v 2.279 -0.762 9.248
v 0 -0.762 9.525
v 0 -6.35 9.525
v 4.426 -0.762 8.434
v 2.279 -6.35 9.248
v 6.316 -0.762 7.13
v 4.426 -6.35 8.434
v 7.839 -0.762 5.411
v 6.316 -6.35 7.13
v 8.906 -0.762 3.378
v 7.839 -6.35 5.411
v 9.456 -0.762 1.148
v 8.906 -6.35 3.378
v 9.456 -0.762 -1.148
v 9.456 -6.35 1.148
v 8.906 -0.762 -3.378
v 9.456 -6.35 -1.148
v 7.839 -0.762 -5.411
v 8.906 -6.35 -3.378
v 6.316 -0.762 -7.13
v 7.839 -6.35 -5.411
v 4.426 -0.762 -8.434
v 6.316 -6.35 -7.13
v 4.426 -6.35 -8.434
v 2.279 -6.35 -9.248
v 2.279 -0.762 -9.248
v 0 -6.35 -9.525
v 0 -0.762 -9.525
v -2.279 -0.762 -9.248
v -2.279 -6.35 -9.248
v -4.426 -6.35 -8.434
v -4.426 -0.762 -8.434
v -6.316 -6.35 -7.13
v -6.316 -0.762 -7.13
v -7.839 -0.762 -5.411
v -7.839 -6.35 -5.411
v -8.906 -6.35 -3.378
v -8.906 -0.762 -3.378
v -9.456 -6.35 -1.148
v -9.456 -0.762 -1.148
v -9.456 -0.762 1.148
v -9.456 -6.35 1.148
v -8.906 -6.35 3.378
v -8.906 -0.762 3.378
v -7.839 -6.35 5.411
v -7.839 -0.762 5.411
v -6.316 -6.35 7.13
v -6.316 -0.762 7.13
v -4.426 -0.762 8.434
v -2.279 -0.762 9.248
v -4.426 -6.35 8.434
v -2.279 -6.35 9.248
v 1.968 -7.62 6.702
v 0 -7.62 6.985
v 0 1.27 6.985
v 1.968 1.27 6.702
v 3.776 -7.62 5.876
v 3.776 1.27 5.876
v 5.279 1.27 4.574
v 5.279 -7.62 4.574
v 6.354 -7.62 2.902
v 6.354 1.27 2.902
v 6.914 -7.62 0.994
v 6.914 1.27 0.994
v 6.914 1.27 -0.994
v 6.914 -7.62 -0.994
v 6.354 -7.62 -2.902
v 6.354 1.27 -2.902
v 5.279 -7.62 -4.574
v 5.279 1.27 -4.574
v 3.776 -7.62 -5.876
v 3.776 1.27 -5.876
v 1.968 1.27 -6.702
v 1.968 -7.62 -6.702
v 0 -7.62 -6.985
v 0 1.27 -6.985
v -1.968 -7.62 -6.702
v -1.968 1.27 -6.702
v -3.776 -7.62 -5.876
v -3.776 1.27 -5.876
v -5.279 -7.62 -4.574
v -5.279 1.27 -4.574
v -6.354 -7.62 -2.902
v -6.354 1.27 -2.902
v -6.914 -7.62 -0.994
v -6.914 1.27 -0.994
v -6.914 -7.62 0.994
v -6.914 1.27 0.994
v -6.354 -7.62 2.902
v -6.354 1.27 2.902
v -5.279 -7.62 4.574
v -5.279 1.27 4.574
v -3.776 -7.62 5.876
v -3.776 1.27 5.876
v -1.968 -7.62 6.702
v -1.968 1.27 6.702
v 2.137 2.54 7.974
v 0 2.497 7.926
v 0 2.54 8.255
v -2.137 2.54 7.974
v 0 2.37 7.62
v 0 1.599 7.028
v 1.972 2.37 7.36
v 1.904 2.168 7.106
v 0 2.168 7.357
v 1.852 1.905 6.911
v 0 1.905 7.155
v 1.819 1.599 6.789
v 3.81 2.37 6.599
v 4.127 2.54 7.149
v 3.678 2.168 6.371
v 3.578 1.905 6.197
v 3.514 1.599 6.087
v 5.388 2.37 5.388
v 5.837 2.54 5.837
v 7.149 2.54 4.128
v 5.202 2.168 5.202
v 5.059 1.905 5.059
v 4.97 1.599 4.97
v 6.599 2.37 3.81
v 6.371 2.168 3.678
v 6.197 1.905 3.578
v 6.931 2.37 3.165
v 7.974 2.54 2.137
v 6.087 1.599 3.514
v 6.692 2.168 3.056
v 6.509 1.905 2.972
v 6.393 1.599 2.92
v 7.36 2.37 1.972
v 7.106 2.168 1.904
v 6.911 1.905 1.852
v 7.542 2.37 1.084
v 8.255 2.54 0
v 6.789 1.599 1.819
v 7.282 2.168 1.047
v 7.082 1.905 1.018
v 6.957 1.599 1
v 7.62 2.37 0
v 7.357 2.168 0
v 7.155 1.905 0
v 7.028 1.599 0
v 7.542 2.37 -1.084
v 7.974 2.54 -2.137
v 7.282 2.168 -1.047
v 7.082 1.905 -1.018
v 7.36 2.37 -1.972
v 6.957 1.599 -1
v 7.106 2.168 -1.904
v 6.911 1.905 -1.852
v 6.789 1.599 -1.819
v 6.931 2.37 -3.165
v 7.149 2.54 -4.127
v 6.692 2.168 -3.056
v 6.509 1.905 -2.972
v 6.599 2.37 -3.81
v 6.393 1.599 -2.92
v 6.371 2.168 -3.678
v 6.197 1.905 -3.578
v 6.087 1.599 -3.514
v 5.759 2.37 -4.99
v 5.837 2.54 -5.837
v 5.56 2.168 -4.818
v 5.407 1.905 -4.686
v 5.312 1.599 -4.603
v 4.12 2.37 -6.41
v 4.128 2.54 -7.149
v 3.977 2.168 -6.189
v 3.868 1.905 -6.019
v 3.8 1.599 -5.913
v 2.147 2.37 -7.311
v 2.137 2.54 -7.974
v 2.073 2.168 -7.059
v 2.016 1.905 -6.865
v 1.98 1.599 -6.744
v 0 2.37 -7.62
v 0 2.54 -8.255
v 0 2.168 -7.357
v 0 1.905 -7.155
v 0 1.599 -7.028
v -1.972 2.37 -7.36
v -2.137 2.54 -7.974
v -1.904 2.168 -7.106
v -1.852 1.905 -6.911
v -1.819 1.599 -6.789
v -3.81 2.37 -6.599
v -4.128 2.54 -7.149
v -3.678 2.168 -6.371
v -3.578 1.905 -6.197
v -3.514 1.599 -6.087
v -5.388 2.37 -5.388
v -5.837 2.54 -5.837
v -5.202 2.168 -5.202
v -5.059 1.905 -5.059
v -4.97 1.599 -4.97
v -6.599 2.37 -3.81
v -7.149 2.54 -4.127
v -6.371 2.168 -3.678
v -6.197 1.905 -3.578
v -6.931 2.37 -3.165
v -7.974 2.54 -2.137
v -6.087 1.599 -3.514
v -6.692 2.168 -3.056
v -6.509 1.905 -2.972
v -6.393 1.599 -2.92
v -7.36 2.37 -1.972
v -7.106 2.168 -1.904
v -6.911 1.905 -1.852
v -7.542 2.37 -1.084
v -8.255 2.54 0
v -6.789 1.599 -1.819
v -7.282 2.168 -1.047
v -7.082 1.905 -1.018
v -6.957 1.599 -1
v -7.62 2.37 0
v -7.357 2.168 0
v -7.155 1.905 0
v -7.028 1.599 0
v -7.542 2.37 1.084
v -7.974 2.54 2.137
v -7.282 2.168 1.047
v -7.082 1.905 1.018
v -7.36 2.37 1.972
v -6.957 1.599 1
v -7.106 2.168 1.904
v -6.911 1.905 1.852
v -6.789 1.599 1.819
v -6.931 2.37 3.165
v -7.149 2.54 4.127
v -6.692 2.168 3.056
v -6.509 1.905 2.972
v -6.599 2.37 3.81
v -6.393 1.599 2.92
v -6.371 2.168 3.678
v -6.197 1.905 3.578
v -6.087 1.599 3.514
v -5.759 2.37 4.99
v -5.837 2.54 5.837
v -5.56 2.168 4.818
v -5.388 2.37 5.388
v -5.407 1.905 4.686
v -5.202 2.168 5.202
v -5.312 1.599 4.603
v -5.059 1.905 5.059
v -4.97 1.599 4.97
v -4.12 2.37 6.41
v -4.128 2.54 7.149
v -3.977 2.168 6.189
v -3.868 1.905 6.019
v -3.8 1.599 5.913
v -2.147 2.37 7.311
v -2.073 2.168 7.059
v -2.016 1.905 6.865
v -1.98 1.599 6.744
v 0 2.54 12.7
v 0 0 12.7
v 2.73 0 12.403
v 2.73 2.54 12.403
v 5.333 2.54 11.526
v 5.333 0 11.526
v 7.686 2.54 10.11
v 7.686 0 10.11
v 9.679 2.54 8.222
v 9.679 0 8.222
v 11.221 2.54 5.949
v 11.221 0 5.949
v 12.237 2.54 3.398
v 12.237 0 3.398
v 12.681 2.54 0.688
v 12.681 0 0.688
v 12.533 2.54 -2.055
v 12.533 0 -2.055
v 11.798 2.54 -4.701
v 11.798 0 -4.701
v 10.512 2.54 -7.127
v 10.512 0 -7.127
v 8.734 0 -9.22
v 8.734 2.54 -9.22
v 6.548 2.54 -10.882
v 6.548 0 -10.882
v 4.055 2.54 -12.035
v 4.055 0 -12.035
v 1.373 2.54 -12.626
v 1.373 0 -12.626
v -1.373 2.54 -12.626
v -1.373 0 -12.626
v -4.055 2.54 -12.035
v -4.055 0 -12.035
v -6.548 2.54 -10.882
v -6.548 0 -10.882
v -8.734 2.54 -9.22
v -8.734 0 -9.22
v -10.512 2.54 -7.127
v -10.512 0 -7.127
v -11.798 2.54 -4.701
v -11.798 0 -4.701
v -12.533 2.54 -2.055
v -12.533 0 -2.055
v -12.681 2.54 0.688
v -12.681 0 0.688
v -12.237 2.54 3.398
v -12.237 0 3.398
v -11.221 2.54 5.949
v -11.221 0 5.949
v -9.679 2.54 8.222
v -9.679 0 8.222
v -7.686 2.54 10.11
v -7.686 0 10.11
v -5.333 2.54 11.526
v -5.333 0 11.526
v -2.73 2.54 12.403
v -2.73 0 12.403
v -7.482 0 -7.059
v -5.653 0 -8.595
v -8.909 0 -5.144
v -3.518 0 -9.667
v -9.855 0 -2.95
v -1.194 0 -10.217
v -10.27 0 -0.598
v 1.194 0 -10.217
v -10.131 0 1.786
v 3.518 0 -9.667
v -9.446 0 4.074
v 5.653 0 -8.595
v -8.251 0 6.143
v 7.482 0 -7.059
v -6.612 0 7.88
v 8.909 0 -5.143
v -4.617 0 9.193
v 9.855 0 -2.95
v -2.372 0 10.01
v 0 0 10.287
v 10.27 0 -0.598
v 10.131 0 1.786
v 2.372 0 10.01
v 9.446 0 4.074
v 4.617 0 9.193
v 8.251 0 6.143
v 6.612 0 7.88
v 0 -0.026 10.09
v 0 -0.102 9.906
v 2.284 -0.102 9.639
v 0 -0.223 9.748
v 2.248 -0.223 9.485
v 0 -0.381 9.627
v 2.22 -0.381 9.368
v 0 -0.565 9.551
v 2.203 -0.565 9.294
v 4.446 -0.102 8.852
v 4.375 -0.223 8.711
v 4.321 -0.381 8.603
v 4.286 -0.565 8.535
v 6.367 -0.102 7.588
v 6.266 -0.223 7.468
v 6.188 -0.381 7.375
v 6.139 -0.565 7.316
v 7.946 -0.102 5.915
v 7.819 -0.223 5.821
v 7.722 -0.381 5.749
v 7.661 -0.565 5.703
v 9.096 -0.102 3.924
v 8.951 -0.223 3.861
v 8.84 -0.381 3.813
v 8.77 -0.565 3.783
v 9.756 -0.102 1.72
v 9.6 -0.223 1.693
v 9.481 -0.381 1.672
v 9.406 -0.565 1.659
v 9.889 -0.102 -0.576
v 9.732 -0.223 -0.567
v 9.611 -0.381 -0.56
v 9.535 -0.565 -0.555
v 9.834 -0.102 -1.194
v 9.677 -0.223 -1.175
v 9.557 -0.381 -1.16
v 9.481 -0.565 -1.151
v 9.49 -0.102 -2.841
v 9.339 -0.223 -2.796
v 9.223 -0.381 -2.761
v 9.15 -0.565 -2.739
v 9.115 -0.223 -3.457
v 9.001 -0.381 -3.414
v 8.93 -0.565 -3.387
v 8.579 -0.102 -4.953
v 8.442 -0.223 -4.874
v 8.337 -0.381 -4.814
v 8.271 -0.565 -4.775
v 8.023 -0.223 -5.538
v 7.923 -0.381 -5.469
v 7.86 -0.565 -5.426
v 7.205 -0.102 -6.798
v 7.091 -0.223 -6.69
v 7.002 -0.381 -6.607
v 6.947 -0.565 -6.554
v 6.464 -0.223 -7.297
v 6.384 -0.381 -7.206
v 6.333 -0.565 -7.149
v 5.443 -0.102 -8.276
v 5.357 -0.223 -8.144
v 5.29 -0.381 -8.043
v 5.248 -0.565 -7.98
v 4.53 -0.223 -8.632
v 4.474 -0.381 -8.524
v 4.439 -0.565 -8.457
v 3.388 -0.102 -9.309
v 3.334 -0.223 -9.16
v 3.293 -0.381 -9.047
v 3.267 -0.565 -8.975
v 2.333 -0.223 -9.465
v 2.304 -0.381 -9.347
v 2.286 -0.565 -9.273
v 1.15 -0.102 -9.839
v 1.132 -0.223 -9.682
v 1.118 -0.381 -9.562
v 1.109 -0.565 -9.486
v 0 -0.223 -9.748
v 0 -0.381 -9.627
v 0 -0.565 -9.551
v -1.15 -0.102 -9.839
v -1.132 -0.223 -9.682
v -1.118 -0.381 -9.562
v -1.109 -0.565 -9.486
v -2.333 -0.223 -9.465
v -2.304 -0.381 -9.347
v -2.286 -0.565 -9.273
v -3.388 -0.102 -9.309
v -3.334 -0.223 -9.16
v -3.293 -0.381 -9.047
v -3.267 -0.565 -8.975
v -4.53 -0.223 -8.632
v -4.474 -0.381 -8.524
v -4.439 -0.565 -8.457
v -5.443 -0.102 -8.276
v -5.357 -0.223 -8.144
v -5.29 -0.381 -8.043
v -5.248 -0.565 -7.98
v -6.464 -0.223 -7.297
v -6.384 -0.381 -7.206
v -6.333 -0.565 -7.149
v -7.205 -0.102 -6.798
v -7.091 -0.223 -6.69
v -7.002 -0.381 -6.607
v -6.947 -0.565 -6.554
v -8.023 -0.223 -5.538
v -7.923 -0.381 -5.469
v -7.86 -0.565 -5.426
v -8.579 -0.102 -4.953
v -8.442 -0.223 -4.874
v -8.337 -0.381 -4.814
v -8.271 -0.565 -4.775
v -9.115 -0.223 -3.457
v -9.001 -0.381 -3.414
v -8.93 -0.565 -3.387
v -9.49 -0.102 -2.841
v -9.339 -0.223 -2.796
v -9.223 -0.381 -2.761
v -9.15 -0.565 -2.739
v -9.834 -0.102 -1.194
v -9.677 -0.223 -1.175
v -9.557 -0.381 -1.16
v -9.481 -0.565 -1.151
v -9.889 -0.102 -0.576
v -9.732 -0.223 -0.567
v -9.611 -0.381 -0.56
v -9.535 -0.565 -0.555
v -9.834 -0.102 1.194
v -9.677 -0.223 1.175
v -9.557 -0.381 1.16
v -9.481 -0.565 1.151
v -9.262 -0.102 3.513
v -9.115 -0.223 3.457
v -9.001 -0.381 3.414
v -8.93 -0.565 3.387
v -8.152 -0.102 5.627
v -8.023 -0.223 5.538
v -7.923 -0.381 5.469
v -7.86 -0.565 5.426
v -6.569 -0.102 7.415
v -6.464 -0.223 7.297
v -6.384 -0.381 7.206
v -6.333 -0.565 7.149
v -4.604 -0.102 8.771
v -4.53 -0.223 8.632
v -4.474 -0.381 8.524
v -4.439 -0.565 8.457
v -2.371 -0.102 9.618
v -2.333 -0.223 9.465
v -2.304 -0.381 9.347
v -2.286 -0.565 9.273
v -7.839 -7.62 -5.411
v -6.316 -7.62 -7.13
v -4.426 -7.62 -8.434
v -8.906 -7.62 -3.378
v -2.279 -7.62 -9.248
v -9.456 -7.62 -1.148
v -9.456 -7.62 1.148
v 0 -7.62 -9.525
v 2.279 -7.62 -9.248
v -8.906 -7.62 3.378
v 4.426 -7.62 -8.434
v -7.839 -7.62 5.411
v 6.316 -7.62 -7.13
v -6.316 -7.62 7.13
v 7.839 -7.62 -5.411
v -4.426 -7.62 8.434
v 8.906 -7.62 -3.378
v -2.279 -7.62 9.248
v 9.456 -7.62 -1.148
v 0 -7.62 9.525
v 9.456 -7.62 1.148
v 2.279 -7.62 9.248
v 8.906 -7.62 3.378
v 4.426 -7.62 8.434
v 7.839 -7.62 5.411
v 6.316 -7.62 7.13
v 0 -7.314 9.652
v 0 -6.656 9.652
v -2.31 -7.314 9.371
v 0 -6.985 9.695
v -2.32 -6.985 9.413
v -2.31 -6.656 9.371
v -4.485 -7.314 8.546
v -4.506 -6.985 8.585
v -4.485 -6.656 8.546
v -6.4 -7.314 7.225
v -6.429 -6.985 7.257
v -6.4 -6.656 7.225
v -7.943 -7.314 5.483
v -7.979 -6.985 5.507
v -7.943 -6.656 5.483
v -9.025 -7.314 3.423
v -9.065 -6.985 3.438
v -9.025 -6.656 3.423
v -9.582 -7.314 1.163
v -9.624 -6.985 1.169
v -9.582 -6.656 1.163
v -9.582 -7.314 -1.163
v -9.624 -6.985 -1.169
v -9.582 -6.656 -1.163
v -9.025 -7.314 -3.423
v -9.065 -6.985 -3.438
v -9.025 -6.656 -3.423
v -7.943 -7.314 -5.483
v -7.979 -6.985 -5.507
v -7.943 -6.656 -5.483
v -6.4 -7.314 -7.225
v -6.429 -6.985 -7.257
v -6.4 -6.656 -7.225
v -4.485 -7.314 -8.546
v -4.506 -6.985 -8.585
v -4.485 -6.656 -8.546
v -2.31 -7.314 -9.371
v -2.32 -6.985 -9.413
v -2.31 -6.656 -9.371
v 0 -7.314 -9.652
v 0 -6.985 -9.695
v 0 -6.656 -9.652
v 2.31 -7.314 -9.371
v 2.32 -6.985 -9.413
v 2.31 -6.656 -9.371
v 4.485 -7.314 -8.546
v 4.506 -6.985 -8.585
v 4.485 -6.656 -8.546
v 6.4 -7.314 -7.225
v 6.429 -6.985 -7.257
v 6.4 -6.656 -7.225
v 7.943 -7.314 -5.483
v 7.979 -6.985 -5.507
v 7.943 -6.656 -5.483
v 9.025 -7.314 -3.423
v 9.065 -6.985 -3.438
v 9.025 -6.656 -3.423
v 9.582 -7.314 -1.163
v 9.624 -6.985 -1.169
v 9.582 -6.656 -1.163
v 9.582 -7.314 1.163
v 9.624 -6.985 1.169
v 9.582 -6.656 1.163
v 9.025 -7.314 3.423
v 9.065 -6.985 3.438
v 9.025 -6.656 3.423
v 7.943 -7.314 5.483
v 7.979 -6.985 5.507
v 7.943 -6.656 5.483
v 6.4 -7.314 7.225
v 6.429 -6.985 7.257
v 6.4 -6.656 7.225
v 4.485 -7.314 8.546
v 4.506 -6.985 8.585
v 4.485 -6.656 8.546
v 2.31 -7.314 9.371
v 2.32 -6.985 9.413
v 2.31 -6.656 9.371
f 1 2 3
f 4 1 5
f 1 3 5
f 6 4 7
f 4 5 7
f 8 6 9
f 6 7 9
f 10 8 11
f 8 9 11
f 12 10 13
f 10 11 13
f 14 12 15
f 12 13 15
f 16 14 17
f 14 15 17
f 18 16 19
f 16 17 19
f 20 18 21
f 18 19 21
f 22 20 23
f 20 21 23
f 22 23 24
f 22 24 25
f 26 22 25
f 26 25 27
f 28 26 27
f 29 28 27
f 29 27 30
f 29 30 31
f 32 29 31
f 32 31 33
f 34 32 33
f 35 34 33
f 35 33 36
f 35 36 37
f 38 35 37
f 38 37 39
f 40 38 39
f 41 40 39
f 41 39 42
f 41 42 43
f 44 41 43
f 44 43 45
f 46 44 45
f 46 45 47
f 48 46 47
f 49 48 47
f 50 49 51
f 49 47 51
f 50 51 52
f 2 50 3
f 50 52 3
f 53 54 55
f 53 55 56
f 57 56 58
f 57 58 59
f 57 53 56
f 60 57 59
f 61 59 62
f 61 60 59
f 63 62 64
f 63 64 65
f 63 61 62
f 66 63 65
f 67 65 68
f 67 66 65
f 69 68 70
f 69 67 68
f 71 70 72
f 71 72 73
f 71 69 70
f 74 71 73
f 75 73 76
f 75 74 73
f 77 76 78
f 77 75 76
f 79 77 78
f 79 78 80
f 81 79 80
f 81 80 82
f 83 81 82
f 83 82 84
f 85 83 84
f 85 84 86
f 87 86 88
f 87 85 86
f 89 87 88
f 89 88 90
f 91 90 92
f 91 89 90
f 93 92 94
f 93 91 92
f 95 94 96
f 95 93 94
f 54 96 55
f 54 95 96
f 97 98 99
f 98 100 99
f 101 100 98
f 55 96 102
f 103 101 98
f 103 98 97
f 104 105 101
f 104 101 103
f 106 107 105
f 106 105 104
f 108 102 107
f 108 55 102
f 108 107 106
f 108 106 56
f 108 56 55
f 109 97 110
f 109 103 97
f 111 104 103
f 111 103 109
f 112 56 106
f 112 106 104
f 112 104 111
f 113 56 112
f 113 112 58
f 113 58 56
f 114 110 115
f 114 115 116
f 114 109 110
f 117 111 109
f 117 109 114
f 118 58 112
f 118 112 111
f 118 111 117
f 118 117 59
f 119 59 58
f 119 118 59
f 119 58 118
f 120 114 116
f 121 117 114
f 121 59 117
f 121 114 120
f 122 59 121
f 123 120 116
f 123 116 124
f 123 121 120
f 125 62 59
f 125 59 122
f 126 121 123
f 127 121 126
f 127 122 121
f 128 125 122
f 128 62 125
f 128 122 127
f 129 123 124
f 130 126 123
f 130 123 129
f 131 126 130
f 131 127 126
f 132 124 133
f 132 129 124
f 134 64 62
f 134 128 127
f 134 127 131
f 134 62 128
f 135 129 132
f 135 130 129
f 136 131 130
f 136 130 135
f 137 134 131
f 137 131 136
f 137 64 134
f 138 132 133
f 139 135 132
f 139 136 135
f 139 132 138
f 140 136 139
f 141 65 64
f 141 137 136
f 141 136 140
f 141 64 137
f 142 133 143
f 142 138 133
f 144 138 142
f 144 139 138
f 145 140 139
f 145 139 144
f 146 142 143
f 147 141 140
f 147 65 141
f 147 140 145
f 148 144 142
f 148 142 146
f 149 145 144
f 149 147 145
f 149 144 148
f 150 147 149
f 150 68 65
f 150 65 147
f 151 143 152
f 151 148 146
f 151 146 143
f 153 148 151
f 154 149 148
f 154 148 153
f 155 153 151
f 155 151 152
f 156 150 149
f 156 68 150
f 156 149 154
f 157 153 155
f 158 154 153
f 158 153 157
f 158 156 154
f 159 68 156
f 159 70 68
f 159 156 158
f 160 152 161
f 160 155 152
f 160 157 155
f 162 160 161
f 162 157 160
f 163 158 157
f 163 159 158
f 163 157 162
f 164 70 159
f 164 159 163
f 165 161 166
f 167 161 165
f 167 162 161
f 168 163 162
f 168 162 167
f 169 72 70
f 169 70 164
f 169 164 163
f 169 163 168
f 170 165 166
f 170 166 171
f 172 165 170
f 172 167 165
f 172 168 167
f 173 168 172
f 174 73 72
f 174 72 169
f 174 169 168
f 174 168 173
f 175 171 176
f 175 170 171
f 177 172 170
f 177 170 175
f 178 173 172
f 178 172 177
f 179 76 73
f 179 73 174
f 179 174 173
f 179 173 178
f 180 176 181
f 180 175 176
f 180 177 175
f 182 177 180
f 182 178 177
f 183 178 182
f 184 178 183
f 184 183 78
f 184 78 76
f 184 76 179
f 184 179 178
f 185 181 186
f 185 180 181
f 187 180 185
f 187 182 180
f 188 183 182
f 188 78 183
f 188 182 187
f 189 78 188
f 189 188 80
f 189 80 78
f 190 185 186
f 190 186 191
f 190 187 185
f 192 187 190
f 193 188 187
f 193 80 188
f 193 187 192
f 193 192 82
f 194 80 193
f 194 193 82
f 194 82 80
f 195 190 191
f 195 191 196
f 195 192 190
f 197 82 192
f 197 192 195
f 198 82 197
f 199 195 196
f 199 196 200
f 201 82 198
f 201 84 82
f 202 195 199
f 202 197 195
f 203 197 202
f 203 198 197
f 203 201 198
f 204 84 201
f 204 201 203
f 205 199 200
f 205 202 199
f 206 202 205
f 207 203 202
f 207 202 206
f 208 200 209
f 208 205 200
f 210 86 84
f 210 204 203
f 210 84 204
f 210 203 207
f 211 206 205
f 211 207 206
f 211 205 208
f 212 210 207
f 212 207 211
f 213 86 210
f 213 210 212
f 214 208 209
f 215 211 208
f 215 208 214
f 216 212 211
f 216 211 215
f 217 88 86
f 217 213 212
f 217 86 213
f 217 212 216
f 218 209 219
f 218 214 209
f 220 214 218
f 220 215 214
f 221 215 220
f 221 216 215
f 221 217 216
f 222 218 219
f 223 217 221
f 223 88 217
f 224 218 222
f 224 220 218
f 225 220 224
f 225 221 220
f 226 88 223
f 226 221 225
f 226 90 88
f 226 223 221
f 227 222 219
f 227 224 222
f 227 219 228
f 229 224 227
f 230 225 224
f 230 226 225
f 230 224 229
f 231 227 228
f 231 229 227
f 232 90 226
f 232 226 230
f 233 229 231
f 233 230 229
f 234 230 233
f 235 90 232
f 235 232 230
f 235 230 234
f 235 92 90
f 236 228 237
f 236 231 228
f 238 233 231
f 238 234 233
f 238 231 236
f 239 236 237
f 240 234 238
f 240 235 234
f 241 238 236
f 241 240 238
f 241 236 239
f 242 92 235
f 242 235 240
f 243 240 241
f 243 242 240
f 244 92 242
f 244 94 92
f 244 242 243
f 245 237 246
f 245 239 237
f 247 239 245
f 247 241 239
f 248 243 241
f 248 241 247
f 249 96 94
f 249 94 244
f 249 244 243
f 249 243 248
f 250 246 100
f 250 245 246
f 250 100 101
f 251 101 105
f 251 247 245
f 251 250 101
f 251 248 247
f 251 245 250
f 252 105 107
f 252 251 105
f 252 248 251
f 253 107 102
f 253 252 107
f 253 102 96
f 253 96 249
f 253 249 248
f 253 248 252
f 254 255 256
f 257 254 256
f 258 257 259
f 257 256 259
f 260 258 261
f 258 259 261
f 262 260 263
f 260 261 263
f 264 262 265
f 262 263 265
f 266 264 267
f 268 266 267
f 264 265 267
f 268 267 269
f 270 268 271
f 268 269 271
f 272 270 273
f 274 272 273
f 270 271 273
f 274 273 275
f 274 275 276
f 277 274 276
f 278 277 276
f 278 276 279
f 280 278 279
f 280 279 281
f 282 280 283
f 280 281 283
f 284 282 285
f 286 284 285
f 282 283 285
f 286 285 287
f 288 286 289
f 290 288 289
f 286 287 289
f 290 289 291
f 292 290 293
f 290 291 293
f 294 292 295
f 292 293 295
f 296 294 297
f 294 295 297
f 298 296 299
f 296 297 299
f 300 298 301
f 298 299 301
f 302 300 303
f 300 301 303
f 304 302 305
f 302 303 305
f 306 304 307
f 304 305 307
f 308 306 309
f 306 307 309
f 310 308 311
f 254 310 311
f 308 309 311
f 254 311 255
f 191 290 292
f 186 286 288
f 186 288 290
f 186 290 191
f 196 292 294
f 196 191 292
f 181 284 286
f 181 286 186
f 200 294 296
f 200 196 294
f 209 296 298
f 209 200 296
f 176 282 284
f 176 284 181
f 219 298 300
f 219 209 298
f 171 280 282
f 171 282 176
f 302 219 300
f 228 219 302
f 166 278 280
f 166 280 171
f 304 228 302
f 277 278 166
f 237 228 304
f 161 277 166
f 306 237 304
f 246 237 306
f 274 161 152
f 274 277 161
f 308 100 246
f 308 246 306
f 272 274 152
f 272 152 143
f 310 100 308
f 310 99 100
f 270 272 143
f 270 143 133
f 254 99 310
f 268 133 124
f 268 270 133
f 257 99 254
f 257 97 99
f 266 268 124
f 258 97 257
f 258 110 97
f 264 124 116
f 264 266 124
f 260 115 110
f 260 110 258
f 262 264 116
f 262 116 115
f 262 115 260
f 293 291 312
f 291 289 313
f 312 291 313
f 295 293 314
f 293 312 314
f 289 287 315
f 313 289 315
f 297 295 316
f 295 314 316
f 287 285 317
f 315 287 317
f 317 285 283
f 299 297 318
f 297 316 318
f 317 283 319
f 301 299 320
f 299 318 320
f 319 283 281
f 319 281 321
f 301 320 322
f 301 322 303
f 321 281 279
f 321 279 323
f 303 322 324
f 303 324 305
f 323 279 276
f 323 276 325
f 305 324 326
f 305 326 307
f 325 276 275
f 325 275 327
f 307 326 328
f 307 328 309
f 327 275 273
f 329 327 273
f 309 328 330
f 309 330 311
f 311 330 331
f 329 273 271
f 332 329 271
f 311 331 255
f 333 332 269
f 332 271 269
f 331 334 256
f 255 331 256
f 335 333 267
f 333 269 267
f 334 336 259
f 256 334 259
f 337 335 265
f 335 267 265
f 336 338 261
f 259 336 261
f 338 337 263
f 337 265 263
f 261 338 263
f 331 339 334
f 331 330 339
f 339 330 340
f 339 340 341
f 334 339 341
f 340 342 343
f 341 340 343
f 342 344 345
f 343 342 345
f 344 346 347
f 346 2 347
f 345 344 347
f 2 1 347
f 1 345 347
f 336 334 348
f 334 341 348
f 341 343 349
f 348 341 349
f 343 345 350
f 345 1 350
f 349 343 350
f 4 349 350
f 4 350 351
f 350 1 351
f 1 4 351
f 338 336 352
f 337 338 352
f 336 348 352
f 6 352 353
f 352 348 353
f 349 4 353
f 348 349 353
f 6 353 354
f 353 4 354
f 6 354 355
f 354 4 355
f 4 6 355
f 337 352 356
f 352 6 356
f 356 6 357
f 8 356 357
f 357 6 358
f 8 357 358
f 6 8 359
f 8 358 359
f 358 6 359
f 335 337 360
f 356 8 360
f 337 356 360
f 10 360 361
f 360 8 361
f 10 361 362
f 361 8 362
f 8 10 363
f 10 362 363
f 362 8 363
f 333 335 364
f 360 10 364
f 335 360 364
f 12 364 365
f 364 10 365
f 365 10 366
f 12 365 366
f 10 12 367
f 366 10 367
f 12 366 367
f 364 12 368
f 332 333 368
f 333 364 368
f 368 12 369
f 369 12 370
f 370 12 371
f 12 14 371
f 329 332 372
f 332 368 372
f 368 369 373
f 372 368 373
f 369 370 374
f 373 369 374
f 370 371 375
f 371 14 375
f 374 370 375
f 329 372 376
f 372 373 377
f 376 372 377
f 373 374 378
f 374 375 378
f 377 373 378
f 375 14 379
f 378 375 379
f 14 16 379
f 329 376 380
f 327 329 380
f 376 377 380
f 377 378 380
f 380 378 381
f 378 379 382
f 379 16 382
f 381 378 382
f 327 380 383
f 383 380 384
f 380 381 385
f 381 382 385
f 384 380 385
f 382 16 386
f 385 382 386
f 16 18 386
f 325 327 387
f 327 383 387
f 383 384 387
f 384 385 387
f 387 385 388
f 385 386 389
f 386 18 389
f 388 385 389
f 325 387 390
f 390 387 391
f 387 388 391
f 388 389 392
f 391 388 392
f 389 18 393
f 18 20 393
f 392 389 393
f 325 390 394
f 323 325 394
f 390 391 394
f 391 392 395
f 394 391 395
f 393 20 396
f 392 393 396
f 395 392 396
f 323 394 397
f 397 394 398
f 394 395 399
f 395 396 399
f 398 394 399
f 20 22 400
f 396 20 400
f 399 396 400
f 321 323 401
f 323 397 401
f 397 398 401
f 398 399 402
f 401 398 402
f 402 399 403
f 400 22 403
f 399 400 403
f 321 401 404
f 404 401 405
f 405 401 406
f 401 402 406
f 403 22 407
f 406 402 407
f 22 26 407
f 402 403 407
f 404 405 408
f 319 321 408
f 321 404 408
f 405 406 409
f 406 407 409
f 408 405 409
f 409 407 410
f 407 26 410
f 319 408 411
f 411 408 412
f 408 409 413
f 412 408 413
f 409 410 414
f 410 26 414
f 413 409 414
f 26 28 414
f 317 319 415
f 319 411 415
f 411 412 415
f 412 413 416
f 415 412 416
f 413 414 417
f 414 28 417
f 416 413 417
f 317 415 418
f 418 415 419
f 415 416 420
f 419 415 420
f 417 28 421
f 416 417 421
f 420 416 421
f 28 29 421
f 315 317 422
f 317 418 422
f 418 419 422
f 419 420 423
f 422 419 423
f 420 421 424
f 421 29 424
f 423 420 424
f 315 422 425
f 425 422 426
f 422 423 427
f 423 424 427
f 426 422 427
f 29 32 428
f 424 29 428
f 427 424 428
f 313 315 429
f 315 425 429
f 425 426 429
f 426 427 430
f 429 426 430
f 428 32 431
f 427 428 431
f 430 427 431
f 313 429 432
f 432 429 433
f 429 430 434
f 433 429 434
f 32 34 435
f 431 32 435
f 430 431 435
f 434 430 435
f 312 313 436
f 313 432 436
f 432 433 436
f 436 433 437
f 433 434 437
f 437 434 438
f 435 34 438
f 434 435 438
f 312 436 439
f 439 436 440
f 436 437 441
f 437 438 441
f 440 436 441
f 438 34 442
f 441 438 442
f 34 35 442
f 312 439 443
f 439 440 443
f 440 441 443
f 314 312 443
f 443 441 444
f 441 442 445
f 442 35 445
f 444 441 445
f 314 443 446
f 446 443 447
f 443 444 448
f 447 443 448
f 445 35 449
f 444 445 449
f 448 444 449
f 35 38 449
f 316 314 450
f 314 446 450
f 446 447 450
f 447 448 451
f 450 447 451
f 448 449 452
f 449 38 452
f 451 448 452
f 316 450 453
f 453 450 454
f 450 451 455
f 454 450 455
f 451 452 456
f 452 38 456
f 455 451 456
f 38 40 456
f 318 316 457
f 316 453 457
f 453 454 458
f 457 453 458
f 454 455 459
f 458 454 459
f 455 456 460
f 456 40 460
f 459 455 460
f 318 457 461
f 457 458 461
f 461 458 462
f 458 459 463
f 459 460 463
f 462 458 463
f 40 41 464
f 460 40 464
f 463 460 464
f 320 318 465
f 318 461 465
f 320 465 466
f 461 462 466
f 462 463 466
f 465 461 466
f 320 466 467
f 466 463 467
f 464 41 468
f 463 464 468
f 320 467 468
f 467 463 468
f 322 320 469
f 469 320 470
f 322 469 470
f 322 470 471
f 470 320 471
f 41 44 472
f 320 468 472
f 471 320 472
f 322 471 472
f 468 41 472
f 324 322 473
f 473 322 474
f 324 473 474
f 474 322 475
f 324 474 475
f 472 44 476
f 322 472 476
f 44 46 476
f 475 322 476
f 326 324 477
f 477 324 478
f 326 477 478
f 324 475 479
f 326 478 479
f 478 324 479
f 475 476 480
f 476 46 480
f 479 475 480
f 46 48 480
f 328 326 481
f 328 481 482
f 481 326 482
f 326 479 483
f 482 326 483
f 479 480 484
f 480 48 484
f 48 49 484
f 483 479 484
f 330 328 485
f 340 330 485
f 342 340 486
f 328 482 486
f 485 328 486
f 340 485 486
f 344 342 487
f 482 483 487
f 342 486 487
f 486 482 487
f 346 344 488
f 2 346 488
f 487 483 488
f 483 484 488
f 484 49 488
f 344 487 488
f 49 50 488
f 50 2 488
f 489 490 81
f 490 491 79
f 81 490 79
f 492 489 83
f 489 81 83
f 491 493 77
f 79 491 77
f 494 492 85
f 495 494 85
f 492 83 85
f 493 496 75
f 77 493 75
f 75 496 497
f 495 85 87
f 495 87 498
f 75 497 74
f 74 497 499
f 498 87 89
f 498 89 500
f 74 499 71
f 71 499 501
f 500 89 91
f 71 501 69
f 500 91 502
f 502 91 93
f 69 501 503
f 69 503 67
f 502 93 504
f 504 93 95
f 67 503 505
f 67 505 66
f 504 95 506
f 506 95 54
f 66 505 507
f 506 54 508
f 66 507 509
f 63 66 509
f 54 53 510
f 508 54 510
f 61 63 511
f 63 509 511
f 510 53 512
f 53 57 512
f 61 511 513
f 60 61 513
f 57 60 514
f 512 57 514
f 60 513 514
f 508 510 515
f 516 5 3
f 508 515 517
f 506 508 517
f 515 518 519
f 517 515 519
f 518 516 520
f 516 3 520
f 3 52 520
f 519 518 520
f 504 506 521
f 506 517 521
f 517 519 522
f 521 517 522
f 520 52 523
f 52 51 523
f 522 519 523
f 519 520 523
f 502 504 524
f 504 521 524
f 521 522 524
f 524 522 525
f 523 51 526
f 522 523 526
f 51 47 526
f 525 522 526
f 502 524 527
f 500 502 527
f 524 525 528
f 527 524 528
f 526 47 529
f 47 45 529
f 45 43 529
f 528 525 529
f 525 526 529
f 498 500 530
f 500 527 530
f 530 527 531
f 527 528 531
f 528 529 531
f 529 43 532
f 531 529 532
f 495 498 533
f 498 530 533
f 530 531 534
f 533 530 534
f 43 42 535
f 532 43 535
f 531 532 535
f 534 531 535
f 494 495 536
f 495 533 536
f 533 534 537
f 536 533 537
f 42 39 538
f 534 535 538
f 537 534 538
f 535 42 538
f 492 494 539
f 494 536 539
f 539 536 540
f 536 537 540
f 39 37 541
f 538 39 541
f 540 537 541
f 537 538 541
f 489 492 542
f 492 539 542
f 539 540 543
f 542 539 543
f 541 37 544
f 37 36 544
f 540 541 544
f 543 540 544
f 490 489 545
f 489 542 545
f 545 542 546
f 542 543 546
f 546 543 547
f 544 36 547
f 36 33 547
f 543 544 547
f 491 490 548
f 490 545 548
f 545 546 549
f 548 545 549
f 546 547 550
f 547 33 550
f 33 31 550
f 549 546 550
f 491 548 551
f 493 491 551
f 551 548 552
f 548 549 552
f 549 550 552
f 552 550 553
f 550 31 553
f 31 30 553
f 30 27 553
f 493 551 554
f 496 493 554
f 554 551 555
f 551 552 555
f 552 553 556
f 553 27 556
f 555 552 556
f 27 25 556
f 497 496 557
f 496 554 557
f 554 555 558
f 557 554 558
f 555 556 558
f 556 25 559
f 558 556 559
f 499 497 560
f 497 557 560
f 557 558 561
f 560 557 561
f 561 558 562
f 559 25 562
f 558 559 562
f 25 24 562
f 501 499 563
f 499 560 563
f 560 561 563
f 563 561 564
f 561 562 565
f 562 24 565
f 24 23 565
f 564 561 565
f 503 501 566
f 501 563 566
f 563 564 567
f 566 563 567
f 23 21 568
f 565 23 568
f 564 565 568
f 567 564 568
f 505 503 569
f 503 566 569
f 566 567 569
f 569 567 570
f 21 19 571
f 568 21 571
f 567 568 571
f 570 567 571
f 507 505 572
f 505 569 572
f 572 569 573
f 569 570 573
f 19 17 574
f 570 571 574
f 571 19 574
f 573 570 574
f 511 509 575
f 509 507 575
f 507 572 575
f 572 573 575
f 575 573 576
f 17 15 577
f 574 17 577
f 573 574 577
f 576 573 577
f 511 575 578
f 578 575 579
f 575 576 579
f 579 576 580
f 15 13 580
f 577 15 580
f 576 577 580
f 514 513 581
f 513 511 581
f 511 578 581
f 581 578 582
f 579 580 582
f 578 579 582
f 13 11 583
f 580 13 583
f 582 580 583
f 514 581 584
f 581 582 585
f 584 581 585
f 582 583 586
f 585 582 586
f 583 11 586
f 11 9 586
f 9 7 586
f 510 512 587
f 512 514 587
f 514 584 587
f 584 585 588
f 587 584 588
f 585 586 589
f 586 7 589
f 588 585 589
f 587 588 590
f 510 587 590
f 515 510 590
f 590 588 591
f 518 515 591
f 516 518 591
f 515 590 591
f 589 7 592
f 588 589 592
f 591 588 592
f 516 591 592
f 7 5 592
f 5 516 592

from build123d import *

# Parameters (mm, degrees)
SKETCH1_R           = 12.7
SKETCH1_R_2         = 6.985
BOSS_EXTRUDE1_DEPTH = 2.54
BOSS_EXTRUDE2_START = -7.62
SKETCH1_3_R         = 9.525
SKETCH1_3_R_2       = 6.985
BOSS_EXTRUDE2_DEPTH = 7.62
FILLET1_R           = 1.27
FILLET2_R           = 0.762


with BuildPart() as part:
    # Sketch1 → Boss-Extrude1 (new body)
    with BuildSketch(Plane(origin=(0, 0, 0), x_dir=(1, 0, 0), z_dir=(0, 1, 0))):
        Circle(SKETCH1_R)
        Circle(SKETCH1_R_2, mode=Mode.SUBTRACT)
    extrude(amount=BOSS_EXTRUDE1_DEPTH)

    # Sketch1<3> → Boss-Extrude2 (add)
    with BuildSketch(Plane(origin=(0, 0, 0), x_dir=(1, 0, 0), z_dir=(0, 1, 0)).offset(BOSS_EXTRUDE2_START)):
        Circle(SKETCH1_3_R)
        Circle(SKETCH1_3_R_2, mode=Mode.SUBTRACT)
    extrude(amount=BOSS_EXTRUDE2_DEPTH)

    # Fillet1
    fillet1_edges = [part.edges().sort_by_distance(p)[0] for p in [
        (-6.985, 2.54, 0),
    ]]
    fillet(fillet1_edges, radius=FILLET1_R)

    # Fillet2
    fillet2_edges = [part.edges().sort_by_distance(p)[0] for p in [
        (-9.525, 0, 0),
    ]]
    fillet(fillet2_edges, radius=FILLET2_R)

    # Sketch2 → Revolve1 (revolve)
    with BuildSketch(Plane(origin=(0, 0, 0), x_dir=(0, 0, -1), z_dir=(1, 0, 0))):
        with BuildLine():
            Line((9.525, -6.35), (9.525, -7.62))
            ThreePointArc((9.525, -7.62), (9.695147737, -6.985), (9.525, -6.35))
        make_face()
    revolve(axis=Axis((0, 3.048, 0), (0, -1, 0)))


solid = part.part
